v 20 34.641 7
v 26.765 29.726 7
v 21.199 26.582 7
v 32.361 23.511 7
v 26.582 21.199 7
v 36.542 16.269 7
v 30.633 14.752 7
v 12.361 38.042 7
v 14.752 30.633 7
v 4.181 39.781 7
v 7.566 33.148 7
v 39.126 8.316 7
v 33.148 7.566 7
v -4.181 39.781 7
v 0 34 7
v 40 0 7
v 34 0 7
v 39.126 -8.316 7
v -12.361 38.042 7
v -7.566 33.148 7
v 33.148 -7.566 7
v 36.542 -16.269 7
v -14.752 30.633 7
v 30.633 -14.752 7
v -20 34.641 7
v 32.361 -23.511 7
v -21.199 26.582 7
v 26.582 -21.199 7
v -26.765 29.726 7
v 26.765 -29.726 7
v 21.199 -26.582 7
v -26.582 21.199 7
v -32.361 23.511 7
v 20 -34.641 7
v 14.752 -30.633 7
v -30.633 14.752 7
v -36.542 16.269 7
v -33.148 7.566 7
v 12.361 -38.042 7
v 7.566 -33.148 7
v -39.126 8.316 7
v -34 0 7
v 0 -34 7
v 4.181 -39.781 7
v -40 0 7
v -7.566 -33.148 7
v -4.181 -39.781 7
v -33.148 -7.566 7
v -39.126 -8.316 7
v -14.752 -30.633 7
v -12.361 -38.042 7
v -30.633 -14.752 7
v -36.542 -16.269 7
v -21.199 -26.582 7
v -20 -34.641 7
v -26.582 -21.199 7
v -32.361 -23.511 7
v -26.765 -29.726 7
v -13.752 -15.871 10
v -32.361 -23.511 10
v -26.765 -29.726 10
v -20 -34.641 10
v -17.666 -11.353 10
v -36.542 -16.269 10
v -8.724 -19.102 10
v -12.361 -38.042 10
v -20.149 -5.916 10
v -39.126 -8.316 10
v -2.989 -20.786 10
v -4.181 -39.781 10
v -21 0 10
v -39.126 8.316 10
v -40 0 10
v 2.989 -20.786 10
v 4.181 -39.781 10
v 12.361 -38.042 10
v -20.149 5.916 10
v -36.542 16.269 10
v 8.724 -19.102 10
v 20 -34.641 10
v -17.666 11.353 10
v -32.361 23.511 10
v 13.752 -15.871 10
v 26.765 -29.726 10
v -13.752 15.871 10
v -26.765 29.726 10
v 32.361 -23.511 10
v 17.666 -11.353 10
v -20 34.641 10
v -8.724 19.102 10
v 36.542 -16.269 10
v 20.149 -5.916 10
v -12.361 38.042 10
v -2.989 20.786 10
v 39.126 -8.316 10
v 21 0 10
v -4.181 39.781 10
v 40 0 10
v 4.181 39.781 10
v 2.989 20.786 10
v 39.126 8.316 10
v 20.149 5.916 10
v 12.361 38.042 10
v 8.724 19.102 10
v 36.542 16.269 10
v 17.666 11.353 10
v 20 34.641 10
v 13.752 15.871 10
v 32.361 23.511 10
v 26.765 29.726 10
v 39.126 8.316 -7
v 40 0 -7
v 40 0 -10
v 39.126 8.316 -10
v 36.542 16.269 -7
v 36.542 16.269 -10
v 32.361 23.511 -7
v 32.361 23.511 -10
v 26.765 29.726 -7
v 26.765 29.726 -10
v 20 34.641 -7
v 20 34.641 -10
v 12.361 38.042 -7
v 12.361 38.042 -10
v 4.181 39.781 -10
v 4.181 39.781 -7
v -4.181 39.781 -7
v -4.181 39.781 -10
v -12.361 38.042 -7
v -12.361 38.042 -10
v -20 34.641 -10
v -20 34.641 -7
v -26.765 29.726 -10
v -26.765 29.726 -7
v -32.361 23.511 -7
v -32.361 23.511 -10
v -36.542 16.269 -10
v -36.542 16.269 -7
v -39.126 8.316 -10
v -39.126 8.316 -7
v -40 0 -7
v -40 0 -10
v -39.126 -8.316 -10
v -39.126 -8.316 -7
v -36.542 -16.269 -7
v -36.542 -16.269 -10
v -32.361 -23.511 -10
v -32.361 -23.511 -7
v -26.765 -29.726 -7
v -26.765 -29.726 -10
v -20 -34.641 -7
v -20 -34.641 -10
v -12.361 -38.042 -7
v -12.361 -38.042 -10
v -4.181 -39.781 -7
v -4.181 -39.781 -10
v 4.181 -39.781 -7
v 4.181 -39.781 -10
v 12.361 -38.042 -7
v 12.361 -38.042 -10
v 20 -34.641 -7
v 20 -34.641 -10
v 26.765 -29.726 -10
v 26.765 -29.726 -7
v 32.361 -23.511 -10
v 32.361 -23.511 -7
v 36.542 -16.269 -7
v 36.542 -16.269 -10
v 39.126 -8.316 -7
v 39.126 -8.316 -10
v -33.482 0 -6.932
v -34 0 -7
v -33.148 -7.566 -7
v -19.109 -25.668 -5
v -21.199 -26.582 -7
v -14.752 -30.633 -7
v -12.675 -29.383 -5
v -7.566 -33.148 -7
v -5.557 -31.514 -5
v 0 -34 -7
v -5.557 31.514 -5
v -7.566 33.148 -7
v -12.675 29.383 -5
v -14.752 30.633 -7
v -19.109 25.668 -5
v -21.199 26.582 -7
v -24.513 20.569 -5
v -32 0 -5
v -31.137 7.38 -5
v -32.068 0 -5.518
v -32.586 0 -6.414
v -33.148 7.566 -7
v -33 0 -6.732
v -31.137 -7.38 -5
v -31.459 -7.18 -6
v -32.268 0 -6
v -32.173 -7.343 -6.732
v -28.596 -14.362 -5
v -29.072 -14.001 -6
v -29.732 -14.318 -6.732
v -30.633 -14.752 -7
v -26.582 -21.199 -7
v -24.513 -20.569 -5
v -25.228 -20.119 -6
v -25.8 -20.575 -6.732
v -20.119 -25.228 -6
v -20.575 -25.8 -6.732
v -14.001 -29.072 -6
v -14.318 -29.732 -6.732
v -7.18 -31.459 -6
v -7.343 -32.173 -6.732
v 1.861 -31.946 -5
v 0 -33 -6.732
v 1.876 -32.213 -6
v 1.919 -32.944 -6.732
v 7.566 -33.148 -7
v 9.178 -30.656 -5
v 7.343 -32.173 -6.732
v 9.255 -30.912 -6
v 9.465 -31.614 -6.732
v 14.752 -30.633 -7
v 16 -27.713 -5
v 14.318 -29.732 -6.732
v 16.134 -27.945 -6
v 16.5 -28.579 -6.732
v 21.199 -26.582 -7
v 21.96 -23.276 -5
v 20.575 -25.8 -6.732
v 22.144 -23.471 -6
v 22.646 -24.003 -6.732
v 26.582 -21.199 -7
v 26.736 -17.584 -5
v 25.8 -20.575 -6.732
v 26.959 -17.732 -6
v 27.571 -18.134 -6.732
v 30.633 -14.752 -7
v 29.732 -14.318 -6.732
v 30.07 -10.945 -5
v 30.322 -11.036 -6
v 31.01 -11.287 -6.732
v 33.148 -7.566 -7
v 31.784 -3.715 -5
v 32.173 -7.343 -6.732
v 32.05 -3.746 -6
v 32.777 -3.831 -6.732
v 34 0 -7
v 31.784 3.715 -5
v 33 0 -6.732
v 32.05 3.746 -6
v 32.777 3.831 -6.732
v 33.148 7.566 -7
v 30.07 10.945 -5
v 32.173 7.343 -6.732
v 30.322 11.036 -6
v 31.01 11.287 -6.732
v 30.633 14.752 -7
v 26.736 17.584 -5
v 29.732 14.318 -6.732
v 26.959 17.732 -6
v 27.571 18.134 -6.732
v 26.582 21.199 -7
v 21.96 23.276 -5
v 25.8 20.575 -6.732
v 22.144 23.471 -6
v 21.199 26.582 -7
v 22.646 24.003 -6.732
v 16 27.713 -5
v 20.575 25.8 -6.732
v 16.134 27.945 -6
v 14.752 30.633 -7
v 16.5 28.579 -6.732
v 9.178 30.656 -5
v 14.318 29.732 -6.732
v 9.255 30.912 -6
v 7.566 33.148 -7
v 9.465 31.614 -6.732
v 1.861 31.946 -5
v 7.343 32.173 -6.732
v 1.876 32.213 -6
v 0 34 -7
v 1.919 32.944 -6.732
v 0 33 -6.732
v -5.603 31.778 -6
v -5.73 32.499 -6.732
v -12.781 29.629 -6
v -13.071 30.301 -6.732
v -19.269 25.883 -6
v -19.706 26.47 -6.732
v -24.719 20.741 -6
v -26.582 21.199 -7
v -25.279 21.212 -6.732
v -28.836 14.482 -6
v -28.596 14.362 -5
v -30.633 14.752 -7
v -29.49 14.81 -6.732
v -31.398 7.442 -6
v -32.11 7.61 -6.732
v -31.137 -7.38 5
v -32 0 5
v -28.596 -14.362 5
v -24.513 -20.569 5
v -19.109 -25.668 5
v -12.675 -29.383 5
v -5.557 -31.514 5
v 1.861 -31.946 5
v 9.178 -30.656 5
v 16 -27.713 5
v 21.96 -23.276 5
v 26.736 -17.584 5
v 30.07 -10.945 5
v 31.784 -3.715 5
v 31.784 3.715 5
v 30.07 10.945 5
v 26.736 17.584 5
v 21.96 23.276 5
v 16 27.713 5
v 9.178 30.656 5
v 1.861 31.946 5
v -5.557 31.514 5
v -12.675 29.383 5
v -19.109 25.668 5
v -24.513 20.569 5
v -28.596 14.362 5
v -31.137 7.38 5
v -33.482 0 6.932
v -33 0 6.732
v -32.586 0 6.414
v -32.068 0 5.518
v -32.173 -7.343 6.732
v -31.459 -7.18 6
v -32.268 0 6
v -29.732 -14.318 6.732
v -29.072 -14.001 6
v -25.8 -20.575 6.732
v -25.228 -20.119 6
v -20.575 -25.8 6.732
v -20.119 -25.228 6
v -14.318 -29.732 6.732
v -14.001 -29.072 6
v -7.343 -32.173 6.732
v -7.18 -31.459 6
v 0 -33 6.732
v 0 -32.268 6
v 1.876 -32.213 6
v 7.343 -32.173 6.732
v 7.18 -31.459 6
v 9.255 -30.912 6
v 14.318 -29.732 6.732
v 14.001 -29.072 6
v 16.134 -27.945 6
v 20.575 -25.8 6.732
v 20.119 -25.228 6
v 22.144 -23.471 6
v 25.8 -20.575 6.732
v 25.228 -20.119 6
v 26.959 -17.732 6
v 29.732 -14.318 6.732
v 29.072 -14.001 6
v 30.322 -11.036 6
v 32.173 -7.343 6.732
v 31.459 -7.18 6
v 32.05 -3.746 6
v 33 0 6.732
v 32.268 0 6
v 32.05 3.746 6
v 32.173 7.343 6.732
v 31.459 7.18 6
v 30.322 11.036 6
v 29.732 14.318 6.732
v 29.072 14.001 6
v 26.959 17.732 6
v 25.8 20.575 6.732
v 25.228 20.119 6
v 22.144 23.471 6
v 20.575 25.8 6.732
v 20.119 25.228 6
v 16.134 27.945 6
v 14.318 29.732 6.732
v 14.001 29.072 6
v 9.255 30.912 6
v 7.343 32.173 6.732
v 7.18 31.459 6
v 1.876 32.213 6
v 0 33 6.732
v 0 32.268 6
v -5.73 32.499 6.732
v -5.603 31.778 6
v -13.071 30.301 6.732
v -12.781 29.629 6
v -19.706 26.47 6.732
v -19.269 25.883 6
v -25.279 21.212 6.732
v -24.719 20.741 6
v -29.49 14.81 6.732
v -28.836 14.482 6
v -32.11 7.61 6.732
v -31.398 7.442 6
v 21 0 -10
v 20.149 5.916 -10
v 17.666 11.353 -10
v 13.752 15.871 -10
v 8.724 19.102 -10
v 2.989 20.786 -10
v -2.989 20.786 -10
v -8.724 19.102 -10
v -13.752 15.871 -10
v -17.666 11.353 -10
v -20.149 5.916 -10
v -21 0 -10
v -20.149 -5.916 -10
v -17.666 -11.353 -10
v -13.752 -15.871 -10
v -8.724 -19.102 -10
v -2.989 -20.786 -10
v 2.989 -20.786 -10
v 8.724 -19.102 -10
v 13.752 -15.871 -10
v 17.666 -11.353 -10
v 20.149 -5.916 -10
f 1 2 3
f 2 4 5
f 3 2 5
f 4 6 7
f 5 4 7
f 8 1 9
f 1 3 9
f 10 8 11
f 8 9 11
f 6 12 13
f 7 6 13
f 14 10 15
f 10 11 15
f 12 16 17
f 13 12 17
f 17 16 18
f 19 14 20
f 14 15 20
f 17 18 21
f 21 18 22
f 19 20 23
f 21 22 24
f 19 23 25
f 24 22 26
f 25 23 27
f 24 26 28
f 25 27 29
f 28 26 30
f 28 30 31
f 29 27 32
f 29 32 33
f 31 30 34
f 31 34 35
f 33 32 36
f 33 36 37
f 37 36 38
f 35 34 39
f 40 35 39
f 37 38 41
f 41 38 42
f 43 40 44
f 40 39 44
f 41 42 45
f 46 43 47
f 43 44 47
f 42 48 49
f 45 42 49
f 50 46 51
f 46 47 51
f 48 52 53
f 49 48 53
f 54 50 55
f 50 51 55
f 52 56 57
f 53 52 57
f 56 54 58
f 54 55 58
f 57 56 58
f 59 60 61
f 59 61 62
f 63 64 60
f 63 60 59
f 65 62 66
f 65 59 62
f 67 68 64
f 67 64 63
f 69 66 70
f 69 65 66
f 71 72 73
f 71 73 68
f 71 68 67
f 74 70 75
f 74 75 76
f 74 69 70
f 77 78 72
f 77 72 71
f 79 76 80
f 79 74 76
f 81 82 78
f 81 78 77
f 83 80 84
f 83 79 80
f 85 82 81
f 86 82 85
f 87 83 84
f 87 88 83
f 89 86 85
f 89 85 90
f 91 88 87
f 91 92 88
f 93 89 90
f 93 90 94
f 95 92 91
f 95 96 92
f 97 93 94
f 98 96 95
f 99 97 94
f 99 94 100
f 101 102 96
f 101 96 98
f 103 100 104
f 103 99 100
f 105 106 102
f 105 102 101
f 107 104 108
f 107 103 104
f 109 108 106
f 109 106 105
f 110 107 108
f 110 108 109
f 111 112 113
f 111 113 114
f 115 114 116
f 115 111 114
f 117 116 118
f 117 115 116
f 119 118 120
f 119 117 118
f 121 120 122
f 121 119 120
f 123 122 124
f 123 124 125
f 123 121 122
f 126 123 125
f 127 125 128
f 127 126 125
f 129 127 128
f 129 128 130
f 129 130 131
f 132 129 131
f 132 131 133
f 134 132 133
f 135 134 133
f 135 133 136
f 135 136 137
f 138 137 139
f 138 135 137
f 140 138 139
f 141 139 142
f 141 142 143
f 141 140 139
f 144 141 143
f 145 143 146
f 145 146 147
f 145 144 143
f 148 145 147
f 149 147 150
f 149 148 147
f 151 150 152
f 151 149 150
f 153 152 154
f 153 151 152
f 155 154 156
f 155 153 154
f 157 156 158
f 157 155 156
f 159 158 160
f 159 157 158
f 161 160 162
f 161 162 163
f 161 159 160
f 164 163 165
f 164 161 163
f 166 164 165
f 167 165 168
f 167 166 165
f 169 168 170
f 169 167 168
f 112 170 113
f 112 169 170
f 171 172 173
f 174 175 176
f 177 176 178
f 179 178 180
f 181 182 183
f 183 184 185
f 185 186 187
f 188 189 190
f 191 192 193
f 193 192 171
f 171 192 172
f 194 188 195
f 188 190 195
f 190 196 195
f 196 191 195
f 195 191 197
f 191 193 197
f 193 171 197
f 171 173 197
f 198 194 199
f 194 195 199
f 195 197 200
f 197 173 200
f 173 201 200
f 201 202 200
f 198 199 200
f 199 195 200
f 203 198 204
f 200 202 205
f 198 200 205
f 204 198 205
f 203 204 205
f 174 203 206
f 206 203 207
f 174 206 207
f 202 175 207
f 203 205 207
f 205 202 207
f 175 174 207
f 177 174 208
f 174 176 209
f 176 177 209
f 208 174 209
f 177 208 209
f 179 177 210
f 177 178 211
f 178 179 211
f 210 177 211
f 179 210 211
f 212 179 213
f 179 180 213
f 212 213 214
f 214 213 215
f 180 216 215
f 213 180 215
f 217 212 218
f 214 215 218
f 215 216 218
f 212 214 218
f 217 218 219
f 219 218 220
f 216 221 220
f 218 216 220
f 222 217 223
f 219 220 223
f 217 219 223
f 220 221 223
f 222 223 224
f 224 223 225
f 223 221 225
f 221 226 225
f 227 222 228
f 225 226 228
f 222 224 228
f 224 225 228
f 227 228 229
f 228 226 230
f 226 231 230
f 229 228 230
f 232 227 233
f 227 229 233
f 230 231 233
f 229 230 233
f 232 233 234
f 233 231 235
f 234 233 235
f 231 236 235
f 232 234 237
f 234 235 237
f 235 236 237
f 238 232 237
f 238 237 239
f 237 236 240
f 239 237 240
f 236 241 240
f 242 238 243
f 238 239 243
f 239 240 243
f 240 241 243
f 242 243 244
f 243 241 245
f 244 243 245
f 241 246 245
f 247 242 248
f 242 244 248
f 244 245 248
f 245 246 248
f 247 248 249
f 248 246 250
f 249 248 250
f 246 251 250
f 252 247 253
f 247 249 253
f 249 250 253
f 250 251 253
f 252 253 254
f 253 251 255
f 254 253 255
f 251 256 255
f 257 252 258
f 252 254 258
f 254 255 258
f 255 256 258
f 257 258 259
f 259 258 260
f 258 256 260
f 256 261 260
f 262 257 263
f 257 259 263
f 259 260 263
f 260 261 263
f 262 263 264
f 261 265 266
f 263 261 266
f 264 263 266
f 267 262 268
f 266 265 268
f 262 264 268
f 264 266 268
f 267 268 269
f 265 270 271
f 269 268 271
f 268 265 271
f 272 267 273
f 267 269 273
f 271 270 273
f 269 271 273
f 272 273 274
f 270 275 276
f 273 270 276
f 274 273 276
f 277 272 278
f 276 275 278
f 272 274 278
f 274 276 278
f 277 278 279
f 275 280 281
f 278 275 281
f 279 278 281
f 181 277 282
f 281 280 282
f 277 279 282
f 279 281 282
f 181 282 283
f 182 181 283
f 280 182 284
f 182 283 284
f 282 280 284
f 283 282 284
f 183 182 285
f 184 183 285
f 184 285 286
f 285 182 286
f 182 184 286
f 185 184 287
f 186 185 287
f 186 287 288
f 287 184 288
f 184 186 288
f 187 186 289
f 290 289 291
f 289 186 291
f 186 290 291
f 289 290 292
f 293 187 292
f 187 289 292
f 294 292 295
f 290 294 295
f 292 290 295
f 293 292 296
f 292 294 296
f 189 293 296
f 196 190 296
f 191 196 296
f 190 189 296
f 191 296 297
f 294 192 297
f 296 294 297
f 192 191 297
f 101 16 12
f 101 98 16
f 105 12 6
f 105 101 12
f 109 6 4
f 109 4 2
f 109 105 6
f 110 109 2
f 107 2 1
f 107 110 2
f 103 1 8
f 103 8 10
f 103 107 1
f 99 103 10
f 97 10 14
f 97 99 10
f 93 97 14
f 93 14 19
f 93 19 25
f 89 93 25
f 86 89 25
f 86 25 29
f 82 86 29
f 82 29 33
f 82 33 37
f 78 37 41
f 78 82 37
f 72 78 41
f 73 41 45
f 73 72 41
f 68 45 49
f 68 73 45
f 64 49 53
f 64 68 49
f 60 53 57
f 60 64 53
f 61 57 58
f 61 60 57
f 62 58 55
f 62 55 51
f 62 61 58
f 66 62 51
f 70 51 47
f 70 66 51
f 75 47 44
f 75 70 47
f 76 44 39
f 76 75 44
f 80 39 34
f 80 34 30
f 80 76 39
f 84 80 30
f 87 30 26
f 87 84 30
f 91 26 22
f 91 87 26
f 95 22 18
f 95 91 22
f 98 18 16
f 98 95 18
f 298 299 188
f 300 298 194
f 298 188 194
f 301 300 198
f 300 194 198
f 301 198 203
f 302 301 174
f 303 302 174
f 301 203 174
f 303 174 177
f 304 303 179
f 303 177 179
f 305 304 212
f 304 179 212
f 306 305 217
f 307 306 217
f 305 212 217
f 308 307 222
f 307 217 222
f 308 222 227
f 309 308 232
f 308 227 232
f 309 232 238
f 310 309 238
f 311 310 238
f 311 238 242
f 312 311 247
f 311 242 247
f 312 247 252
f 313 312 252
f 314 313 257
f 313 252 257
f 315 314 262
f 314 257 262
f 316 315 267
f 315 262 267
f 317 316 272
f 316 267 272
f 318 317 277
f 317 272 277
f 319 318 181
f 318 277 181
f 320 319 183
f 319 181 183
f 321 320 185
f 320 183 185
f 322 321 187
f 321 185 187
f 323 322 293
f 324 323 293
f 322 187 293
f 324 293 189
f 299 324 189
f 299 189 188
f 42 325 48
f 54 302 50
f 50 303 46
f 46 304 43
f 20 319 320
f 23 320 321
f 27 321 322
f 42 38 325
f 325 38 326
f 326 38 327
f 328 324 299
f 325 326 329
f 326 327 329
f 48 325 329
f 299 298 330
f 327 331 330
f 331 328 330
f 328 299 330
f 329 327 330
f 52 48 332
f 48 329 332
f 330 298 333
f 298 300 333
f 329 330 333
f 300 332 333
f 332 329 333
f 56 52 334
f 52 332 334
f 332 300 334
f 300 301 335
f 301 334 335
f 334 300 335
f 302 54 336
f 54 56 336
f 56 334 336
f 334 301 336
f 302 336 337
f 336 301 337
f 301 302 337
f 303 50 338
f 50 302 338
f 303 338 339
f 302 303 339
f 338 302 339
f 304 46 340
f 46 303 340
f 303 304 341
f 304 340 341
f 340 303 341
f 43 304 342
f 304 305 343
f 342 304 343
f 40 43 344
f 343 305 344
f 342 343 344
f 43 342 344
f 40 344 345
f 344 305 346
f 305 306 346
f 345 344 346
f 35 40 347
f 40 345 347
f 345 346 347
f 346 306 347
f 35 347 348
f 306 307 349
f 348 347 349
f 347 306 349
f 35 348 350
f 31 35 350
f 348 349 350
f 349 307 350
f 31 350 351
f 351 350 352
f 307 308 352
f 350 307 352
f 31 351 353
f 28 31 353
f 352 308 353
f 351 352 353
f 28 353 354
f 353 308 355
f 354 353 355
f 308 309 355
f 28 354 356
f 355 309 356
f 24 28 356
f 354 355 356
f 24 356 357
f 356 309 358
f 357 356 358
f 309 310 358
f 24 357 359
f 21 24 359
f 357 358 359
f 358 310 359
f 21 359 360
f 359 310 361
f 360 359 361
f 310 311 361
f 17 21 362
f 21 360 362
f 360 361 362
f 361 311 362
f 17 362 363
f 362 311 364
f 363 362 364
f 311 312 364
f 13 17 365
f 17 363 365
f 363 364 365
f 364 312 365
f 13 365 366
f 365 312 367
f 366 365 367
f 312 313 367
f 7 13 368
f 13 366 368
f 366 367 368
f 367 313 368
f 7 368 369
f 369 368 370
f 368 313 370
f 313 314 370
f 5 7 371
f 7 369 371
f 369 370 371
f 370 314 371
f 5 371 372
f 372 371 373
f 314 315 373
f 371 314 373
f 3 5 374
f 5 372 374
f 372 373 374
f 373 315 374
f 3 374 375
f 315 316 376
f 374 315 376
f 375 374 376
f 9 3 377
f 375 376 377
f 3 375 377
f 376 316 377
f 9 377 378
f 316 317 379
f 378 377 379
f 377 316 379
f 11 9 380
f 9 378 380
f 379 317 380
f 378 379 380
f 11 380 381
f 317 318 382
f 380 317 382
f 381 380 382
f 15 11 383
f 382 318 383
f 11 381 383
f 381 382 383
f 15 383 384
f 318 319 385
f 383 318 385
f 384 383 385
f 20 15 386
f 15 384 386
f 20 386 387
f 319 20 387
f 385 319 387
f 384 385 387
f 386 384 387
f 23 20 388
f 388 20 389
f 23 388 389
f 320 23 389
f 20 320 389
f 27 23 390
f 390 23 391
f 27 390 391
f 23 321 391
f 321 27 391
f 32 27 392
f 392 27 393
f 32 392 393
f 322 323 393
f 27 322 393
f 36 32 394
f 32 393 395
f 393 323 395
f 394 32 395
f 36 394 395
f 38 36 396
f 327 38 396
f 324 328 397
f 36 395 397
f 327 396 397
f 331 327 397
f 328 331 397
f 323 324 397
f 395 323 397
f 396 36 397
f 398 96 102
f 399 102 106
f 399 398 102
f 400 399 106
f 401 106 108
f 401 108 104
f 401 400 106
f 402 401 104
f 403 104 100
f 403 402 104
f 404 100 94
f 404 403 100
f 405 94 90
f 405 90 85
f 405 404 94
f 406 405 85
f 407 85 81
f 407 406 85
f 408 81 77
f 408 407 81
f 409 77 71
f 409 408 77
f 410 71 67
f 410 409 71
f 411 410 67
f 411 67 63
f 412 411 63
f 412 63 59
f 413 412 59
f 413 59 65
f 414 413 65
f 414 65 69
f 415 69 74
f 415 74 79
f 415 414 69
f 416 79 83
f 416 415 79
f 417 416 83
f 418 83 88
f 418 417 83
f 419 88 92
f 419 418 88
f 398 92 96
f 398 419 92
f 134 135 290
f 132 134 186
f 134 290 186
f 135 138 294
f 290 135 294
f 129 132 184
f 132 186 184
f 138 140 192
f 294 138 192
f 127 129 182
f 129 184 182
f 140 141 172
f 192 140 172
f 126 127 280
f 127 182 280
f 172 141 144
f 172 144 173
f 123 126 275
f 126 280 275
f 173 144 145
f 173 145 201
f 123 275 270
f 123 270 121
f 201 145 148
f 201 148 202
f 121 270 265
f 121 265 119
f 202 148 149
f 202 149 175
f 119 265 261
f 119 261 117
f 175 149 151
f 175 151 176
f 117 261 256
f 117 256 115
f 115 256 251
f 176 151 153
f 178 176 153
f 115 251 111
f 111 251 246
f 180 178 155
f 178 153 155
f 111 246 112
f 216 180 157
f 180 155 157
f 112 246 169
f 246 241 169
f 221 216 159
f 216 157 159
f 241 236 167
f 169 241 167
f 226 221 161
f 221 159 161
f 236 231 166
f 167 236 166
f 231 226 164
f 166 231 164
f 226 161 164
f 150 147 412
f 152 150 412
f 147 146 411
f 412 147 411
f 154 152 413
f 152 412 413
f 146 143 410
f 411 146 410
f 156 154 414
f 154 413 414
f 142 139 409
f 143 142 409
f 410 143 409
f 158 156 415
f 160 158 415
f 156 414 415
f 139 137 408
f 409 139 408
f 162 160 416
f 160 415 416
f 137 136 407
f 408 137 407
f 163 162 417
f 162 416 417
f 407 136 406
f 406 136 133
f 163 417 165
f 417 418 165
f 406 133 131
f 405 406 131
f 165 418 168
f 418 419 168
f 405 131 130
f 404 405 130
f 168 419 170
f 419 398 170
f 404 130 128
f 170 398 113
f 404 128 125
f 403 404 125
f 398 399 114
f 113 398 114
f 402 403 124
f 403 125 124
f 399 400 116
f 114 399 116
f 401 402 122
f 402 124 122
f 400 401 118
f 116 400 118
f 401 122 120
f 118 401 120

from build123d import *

# Parameters (mm, degrees)
SKETCH_1_R      = 40
SKETCH_1_R_2    = 30
SKETCH_1_R_3    = 21
EXTRUDE_1_DEPTH = 10


with BuildPart() as part:
    # 草图1 → 凸台-拉伸1 (new, symmetric)
    with BuildSketch(Plane.XY):
        Circle(SKETCH_1_R)
        Circle(SKETCH_1_R_2, mode=Mode.SUBTRACT)
        Circle(SKETCH_1_R_2)
        Circle(SKETCH_1_R_3, mode=Mode.SUBTRACT)
    extrude(amount=EXTRUDE_1_DEPTH, both=True)

    # 草图2 → 切除-旋转1 (revolve, cut)
    with BuildSketch(Plane(origin=(0, 0, 0), x_dir=(0, 0, -1), z_dir=(1, 0, 0)), mode=Mode.PRIVATE) as cut_revolve_1_sk:
        with BuildLine():
            Line((-7, 40), (-7, 34))
            ThreePointArc((-7, 34), (-6.414213562, 32.585786438), (-5, 32))
            Line((-5, 32), (5, 32))
            ThreePointArc((5, 32), (6.414213562, 32.585786438), (7, 34))
            Line((7, 34), (7, 40))
            Line((7, 40), (-7, 40))
        make_face()
    revolve(cut_revolve_1_sk.sketch.rotate(Axis((0, 0, 0), (0, 0, 1)), 90), axis=Axis((0, 0, 0), (0, 0, 1)), mode=Mode.SUBTRACT)


solid = part.part
